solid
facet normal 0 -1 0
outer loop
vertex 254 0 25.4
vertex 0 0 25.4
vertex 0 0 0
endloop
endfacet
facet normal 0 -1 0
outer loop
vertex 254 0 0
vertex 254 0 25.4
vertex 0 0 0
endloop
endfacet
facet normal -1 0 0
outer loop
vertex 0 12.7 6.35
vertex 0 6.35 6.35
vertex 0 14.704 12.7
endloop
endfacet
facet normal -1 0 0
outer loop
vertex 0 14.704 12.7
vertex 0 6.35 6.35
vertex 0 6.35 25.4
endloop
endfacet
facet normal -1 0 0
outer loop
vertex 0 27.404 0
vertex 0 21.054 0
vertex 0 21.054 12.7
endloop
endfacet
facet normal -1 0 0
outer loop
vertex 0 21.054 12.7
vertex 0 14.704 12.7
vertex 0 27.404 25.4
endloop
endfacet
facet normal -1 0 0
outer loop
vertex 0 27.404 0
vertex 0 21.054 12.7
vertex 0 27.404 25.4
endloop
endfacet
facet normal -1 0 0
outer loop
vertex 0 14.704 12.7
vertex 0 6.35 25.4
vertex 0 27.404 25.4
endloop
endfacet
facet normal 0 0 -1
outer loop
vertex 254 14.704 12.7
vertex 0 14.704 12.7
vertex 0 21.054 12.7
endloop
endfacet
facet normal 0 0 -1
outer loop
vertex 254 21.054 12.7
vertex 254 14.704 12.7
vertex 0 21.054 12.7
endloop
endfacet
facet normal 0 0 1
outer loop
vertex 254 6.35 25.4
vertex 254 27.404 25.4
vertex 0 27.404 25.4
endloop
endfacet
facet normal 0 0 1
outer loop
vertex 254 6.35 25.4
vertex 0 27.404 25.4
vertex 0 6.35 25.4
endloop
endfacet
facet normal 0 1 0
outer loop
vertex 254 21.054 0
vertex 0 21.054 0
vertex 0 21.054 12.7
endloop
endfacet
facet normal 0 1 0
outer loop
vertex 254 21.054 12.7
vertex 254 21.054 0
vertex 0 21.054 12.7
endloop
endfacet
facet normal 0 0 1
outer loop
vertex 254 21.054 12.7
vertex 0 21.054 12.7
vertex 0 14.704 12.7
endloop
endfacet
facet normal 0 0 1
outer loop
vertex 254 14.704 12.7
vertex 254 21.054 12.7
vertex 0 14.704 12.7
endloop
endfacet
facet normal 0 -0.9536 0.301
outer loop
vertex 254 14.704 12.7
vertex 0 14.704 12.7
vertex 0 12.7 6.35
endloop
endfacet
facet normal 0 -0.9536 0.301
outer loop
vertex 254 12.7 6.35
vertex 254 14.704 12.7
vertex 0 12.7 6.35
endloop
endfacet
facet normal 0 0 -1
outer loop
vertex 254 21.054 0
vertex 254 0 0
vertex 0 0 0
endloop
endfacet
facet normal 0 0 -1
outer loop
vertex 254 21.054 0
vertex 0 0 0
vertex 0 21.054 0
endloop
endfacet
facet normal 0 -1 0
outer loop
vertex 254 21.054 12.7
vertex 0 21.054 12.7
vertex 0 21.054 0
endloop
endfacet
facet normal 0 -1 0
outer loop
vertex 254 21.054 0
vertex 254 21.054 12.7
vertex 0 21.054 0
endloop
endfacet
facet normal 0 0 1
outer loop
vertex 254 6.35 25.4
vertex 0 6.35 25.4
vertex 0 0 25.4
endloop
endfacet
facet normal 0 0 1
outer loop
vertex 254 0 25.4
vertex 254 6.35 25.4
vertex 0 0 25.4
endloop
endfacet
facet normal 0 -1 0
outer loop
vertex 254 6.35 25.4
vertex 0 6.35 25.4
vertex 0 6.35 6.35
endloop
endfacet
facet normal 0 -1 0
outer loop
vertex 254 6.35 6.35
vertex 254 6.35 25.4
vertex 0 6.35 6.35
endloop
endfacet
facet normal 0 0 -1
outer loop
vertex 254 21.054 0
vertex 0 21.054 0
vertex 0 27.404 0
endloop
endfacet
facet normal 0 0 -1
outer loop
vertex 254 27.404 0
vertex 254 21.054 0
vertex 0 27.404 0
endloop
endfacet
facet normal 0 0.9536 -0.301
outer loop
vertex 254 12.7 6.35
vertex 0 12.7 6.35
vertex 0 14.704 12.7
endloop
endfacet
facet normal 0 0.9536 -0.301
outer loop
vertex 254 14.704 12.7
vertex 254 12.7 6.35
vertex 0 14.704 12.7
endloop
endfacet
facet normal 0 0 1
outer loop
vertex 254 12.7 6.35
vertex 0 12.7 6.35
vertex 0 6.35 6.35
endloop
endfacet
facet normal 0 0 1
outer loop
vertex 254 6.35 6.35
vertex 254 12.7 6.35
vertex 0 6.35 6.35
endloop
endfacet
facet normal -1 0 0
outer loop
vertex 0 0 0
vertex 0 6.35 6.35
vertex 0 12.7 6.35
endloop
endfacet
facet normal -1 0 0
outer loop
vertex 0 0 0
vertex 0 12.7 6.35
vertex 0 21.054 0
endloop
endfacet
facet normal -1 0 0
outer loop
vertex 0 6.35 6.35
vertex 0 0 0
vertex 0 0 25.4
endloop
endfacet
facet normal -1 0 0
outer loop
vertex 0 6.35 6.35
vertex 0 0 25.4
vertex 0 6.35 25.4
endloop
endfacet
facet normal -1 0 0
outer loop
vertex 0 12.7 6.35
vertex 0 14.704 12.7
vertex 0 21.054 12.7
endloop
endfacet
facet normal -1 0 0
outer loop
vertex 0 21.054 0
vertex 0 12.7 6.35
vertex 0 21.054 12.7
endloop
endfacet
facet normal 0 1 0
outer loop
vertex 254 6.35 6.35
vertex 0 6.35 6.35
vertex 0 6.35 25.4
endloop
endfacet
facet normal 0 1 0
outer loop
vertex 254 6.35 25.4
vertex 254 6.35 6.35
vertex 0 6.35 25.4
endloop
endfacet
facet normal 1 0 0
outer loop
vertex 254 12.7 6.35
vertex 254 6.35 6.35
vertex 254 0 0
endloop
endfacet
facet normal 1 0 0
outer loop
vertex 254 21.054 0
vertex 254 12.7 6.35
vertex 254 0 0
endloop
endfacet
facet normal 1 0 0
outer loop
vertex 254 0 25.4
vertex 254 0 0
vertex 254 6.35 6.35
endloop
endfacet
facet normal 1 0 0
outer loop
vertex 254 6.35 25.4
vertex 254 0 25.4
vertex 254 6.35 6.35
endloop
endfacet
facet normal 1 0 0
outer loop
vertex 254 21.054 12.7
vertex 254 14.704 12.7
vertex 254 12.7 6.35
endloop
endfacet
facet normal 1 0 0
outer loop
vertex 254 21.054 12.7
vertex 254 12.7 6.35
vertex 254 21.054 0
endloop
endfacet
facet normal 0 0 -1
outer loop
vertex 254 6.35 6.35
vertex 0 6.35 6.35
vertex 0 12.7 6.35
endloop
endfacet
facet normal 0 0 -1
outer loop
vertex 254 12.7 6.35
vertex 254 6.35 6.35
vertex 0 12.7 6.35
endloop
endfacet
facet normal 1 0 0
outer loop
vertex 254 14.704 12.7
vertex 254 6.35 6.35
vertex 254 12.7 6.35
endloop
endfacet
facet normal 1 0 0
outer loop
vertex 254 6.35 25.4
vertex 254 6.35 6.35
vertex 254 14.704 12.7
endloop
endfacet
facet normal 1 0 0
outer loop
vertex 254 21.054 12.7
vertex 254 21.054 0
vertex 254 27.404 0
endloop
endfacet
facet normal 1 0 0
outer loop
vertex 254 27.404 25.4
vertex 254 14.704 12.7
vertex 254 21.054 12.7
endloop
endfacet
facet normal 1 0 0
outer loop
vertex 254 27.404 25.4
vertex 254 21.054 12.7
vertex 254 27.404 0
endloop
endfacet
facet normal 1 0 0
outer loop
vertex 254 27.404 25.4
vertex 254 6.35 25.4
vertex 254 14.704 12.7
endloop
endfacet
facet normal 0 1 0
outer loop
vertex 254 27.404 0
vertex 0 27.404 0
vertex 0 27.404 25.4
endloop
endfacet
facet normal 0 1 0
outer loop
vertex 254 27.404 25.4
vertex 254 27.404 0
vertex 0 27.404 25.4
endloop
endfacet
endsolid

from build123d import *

# Parameters (mm, degrees)
F1_DEPTH = 254
F3_DEPTH = 254


with BuildPart() as f1:
    # F0 (on Right) → F1 (new body)
    with BuildSketch(Plane.YZ):
        Polygon((0, 25.4), (0, 0), (21.053882, 0), (21.053882, 12.7), (14.703882, 12.7), (12.7, 6.35), (6.35, 6.35), (6.35, 25.4), align=None)
    extrude(amount=F1_DEPTH)


with BuildPart() as f3:
    # F2 (on Right) → F3 (new body)
    with BuildSketch(Plane.YZ):
        Polygon((6.35, 25.4), (6.35, 6.35), (12.7, 6.35), (14.703882, 12.7), (21.053882, 12.7), (21.053882, 0), (27.403882, 0), (27.403882, 25.4), align=None)
    extrude(amount=F3_DEPTH)


solid = Compound([f1.part, f3.part])
